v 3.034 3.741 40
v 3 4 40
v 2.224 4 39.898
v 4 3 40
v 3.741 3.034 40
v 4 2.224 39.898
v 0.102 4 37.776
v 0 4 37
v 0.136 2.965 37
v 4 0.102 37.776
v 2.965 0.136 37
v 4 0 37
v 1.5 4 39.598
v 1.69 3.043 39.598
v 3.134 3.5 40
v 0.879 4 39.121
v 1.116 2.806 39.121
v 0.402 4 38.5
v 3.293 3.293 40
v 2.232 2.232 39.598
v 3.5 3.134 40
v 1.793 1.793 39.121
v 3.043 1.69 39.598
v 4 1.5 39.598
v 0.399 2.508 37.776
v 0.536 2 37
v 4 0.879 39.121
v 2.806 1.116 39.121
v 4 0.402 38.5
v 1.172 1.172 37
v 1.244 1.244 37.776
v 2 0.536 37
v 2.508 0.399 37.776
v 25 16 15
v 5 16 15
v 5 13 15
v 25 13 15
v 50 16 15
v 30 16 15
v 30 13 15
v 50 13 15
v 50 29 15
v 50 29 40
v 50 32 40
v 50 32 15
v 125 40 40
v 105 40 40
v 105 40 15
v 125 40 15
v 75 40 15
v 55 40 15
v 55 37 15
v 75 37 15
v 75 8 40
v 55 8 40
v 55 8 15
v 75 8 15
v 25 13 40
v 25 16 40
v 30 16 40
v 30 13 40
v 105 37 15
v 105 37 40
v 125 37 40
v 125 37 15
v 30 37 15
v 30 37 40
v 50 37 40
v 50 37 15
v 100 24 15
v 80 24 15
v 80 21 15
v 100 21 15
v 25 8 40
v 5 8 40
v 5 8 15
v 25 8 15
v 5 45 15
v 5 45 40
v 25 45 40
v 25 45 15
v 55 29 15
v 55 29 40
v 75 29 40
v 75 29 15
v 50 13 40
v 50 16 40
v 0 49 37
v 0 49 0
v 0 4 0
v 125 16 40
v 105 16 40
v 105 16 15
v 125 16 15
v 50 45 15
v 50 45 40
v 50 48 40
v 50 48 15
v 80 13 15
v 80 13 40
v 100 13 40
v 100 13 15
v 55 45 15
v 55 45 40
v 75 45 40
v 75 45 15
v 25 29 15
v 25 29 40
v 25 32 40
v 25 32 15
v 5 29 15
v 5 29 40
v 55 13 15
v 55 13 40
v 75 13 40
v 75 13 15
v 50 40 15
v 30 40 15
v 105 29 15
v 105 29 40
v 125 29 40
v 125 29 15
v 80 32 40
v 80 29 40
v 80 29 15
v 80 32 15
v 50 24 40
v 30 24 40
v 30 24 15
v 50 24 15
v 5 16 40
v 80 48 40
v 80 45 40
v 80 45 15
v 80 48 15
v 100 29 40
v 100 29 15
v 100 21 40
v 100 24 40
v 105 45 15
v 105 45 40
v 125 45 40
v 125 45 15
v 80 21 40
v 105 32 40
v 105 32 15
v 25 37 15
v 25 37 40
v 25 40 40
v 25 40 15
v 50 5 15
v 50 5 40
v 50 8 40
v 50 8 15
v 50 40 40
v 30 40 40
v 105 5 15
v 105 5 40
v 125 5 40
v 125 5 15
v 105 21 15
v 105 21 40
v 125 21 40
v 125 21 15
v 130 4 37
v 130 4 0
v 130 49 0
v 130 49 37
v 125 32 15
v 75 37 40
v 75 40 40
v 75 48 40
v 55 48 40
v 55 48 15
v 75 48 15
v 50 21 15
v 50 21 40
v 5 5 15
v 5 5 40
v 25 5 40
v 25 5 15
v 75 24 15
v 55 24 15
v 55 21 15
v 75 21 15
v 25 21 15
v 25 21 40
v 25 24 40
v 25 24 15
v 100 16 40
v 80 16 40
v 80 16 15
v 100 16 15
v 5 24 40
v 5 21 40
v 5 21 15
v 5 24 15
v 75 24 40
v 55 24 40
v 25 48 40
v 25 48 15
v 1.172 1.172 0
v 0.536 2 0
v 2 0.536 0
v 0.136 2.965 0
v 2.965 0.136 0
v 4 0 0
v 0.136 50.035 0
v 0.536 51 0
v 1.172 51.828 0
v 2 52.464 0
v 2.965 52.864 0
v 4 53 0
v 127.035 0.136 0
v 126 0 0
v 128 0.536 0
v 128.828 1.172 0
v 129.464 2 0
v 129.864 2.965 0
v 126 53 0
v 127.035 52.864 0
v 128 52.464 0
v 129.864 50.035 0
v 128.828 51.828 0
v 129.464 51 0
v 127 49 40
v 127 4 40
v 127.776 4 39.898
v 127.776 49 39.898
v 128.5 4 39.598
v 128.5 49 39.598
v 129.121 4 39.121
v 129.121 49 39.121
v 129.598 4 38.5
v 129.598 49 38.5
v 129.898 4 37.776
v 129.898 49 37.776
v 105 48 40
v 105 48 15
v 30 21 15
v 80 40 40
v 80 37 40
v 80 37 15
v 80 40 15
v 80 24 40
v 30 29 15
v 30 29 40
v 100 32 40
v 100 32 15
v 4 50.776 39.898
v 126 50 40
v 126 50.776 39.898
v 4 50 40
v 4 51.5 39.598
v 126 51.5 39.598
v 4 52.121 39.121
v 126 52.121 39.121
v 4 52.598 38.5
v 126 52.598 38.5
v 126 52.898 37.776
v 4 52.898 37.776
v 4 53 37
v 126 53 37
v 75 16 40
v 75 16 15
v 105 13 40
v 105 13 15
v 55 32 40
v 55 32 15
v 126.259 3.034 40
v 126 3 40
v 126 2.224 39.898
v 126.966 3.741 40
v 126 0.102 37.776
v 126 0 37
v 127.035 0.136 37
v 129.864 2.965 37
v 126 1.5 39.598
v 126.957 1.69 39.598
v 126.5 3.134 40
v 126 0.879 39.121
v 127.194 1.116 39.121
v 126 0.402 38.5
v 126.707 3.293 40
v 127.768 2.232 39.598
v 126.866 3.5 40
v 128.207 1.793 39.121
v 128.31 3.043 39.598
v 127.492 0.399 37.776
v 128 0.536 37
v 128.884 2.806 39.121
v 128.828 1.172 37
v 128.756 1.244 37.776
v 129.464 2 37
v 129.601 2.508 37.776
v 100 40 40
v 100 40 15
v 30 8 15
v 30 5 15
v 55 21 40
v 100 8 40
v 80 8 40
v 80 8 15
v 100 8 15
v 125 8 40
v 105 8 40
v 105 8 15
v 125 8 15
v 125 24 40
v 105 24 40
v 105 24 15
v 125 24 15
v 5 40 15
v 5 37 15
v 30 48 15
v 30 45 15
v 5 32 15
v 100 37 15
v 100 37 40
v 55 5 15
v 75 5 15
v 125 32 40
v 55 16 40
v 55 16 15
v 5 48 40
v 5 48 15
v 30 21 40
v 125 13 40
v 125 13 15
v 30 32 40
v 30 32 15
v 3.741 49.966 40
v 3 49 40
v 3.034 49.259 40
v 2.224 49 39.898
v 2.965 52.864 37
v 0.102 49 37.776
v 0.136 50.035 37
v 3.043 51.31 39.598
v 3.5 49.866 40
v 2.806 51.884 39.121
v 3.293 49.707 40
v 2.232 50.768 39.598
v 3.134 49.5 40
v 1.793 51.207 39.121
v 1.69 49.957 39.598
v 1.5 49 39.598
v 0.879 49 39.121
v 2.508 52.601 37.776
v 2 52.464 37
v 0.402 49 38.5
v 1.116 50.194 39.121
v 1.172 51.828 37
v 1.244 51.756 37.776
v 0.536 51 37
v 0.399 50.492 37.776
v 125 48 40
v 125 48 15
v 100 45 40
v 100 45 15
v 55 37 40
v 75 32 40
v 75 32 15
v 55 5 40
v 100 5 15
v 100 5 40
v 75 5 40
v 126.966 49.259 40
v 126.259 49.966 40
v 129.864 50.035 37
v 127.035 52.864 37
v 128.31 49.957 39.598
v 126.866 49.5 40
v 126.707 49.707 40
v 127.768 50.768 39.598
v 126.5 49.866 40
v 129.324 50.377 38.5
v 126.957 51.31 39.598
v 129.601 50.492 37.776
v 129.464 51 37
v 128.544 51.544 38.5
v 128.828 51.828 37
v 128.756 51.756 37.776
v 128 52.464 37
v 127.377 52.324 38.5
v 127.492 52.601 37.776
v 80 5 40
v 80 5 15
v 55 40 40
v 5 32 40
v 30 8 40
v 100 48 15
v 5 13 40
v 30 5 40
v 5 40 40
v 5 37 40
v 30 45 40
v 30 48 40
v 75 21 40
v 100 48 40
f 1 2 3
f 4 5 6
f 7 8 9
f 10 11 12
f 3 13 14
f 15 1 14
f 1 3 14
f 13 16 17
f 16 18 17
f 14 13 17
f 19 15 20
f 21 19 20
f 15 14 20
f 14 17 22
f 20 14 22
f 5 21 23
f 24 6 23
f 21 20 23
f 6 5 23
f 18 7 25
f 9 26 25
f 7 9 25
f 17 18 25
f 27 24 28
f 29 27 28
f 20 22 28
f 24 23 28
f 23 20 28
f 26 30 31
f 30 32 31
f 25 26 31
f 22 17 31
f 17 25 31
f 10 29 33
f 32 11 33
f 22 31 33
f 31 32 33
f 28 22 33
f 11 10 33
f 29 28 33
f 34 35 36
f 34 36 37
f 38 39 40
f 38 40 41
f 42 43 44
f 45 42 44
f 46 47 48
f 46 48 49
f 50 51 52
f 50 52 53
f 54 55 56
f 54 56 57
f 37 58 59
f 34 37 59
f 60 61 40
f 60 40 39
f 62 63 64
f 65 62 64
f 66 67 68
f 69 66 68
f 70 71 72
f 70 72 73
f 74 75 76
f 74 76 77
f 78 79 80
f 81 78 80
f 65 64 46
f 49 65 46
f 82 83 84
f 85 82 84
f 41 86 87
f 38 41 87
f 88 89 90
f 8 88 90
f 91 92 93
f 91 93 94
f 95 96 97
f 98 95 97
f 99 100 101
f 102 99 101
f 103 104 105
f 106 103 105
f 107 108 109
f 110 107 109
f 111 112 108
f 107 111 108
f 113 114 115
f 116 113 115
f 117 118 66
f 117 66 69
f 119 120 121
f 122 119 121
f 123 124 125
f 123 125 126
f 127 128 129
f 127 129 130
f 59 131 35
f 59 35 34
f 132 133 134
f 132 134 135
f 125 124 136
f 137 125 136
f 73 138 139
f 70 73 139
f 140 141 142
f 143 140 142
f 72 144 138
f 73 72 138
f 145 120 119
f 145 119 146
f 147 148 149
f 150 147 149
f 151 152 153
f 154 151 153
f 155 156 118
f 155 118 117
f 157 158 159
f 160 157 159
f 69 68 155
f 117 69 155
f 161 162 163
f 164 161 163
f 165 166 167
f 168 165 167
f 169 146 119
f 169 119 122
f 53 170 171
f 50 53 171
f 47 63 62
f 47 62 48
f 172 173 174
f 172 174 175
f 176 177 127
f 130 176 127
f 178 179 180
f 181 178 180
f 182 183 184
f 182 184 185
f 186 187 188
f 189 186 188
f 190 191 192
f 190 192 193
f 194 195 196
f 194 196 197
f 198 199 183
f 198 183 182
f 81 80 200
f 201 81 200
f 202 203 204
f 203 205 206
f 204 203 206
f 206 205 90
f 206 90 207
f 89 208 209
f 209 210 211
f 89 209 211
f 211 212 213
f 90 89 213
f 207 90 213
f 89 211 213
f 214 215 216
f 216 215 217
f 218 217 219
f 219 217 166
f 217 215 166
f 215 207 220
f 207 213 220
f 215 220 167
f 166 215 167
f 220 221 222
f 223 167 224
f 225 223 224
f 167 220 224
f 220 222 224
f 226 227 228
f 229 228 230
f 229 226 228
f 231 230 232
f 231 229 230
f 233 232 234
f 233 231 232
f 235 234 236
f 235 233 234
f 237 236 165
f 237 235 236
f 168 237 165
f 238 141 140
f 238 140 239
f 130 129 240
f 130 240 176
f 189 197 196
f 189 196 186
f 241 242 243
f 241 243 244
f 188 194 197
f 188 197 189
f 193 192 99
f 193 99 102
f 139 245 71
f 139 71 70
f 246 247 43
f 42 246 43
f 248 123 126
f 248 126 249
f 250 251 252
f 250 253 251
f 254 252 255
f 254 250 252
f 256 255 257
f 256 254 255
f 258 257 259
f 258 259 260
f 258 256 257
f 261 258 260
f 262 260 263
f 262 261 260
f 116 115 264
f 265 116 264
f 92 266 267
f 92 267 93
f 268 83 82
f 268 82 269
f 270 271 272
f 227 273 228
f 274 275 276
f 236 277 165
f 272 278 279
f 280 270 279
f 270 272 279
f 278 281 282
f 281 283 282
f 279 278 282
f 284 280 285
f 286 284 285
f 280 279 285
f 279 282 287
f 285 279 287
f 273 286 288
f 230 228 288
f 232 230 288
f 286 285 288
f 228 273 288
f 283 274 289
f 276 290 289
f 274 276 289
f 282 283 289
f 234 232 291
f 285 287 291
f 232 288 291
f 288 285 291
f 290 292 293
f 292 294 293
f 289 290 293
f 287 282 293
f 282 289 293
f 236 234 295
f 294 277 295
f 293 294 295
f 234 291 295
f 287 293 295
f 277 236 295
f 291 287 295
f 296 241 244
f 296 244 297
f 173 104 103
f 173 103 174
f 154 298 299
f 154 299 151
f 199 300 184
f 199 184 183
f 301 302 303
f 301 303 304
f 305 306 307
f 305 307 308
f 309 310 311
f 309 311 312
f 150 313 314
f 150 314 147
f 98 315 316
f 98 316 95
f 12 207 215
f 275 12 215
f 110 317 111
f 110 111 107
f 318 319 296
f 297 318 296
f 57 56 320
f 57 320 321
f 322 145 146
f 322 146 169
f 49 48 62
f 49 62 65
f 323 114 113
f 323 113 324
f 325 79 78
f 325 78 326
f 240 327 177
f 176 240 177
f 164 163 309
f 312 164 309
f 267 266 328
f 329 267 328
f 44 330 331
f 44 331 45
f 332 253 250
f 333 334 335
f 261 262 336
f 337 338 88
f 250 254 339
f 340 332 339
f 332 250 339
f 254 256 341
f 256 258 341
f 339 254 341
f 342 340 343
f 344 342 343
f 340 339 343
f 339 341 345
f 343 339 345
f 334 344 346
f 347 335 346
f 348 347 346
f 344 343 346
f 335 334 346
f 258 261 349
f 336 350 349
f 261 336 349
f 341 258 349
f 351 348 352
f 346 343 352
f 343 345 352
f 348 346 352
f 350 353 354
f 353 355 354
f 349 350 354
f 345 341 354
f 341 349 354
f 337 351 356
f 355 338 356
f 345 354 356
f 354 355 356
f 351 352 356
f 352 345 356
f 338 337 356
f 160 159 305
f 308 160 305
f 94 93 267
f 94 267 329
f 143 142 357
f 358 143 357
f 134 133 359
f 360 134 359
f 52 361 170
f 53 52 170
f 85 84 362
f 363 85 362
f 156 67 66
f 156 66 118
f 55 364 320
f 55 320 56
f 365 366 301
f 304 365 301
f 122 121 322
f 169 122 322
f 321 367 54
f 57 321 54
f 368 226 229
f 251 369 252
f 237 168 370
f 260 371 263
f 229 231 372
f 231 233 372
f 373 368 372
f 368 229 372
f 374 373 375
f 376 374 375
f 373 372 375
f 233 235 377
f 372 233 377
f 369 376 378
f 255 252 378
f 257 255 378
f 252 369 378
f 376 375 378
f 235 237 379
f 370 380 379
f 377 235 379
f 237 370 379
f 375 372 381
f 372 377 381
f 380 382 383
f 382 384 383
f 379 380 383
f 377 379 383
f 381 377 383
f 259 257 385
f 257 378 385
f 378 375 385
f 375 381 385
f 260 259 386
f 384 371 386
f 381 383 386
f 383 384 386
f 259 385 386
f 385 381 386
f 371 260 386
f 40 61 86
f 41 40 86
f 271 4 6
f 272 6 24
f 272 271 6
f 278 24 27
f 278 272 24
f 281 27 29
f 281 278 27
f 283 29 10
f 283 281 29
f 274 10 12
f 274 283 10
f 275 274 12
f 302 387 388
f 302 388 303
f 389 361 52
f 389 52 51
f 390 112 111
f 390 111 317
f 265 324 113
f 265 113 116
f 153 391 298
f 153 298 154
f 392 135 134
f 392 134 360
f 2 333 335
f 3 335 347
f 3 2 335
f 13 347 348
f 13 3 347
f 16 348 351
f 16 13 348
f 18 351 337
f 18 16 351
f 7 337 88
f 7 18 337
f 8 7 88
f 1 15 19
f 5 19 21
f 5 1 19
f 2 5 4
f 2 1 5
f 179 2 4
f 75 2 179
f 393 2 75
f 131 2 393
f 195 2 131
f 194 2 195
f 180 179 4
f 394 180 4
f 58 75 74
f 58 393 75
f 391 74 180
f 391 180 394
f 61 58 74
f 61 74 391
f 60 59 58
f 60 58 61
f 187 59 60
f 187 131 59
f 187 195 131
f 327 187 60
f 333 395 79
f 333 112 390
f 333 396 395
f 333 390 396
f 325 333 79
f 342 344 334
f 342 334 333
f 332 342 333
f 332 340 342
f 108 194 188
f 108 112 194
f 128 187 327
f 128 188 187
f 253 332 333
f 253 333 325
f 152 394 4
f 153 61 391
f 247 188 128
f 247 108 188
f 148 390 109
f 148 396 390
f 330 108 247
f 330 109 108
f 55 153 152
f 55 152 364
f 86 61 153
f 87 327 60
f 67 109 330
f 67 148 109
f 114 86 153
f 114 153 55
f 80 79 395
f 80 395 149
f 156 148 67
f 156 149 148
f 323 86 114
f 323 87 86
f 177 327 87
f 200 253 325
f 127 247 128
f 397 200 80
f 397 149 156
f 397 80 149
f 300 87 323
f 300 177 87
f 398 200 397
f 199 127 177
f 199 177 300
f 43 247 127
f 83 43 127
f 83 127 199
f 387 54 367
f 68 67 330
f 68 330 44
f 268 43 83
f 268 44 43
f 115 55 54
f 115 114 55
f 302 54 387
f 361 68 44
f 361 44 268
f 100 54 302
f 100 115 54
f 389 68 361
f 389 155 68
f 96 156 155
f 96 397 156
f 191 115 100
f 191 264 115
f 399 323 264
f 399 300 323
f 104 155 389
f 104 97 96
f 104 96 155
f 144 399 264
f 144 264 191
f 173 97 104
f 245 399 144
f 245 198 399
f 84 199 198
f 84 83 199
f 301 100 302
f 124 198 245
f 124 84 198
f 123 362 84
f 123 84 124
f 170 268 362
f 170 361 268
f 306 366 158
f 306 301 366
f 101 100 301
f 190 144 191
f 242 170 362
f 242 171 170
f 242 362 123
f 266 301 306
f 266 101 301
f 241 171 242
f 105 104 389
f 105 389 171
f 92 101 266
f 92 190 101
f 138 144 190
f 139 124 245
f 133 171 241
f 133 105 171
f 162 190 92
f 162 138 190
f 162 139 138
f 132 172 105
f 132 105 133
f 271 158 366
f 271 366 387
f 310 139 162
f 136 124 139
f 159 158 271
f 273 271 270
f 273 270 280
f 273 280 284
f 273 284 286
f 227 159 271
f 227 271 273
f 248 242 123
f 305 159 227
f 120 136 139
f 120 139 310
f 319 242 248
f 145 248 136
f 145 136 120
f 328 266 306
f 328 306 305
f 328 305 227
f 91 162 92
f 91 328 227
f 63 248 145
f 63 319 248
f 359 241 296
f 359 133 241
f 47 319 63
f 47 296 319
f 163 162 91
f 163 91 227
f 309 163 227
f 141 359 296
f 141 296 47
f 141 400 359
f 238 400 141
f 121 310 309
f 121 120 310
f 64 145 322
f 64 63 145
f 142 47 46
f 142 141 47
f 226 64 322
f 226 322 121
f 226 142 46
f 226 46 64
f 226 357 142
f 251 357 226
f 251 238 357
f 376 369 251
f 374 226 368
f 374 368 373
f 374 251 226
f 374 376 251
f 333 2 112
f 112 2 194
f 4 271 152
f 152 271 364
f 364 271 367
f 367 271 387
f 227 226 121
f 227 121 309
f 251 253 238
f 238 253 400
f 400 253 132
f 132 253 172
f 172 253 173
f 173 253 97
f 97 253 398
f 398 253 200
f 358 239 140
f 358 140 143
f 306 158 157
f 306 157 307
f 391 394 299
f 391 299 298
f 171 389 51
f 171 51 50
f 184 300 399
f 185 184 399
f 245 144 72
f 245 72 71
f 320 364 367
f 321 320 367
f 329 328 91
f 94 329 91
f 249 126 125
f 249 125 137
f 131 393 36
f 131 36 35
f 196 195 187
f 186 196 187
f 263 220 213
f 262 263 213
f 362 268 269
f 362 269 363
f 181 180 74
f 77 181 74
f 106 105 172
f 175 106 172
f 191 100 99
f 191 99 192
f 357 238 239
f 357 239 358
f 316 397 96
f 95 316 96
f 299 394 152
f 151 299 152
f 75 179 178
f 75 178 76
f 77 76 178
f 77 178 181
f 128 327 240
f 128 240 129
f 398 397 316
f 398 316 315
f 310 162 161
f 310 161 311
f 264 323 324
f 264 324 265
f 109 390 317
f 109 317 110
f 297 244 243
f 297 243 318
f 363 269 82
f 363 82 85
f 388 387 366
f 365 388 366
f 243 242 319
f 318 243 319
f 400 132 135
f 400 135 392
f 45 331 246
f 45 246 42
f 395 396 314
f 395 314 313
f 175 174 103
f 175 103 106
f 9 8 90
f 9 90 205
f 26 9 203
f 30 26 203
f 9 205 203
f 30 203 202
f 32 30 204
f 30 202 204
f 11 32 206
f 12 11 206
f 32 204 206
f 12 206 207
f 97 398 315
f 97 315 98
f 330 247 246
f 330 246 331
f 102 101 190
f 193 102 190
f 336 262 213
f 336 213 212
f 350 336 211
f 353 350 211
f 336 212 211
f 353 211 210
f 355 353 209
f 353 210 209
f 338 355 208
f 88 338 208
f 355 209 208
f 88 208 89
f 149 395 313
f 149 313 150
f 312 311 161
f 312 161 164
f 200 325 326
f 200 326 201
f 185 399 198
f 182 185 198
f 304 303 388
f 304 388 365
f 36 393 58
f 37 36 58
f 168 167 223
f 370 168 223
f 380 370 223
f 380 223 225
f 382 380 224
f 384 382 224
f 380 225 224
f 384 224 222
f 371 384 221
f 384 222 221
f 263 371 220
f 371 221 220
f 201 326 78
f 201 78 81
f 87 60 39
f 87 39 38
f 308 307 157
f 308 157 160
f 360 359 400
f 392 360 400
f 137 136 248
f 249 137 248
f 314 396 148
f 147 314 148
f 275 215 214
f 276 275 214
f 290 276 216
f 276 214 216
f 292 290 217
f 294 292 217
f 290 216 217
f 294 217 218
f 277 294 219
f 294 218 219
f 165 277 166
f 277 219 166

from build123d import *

# Parameters (mm, degrees)
F1_DEPTH = 40
F2_W     = 20
F2_H     = 3
F3_DEPTH = 25
F4_R     = 3


with BuildPart() as f1:
    # F0 (on Top) → F1 (new body)
    with BuildSketch(Plane.XY):
        with BuildLine():
            ThreePointArc((0, 4), (1.171573, 1.171573), (4, 0))
            Line((4, 0), (126, 0))
            ThreePointArc((126, 0), (128.828427, 1.171573), (130, 4))
            Line((130, 4), (130, 49))
            ThreePointArc((130, 49), (128.828427, 51.828427), (126, 53))
            Line((126, 53), (4, 53))
            ThreePointArc((4, 53), (1.171573, 51.828427), (0, 49))
            Line((0, 49), (0, 4))
        make_face()
    extrude(amount=F1_DEPTH)

    # F2 (on face) → F3 (cut)
    with BuildSketch(Plane.XY.offset(40)):
        with Locations((15, 46.5)):
            Rectangle(F2_W, F2_H)
        with Locations((15, 38.5)):
            Rectangle(F2_W, F2_H)
        with Locations((15, 30.5)):
            Rectangle(F2_W, F2_H)
        with Locations((15, 22.5)):
            Rectangle(F2_W, F2_H)
        with Locations((15, 14.5)):
            Rectangle(F2_W, F2_H)
        with Locations((15, 6.5)):
            Rectangle(F2_W, F2_H)
        with Locations((40, 46.5)):
            Rectangle(F2_W, F2_H)
        with Locations((40, 38.5)):
            Rectangle(F2_W, F2_H)
        with Locations((40, 30.5)):
            Rectangle(F2_W, F2_H)
        with Locations((40, 22.5)):
            Rectangle(F2_W, F2_H)
        with Locations((40, 14.5)):
            Rectangle(F2_W, F2_H)
        with Locations((40, 6.5)):
            Rectangle(F2_W, F2_H)
        with Locations((65, 46.5)):
            Rectangle(F2_W, F2_H)
        with Locations((65, 38.5)):
            Rectangle(F2_W, F2_H)
        with Locations((65, 30.5)):
            Rectangle(F2_W, F2_H)
        with Locations((65, 22.5)):
            Rectangle(F2_W, F2_H)
        with Locations((65, 14.5)):
            Rectangle(F2_W, F2_H)
        with Locations((65, 6.5)):
            Rectangle(F2_W, F2_H)
        with Locations((90, 46.5)):
            Rectangle(F2_W, F2_H)
        with Locations((90, 38.5)):
            Rectangle(F2_W, F2_H)
        with Locations((90, 30.5)):
            Rectangle(F2_W, F2_H)
        with Locations((90, 22.5)):
            Rectangle(F2_W, F2_H)
        with Locations((90, 14.5)):
            Rectangle(F2_W, F2_H)
        with Locations((90, 6.5)):
            Rectangle(F2_W, F2_H)
        with Locations((115, 46.5)):
            Rectangle(F2_W, F2_H)
        with Locations((115, 38.5)):
            Rectangle(F2_W, F2_H)
        with Locations((115, 30.5)):
            Rectangle(F2_W, F2_H)
        with Locations((115, 22.5)):
            Rectangle(F2_W, F2_H)
        with Locations((115, 14.5)):
            Rectangle(F2_W, F2_H)
        with Locations((115, 6.5)):
            Rectangle(F2_W, F2_H)
    extrude(amount=-F3_DEPTH, mode=Mode.SUBTRACT)

    # F4
    f4_edges = [f1.edges().sort_by_distance(p)[0] for p in [
        (65, 53, 40),
        (1.171573, 51.828427, 40),
    ]]
    fillet(f4_edges, radius=F4_R)


solid = f1.part
